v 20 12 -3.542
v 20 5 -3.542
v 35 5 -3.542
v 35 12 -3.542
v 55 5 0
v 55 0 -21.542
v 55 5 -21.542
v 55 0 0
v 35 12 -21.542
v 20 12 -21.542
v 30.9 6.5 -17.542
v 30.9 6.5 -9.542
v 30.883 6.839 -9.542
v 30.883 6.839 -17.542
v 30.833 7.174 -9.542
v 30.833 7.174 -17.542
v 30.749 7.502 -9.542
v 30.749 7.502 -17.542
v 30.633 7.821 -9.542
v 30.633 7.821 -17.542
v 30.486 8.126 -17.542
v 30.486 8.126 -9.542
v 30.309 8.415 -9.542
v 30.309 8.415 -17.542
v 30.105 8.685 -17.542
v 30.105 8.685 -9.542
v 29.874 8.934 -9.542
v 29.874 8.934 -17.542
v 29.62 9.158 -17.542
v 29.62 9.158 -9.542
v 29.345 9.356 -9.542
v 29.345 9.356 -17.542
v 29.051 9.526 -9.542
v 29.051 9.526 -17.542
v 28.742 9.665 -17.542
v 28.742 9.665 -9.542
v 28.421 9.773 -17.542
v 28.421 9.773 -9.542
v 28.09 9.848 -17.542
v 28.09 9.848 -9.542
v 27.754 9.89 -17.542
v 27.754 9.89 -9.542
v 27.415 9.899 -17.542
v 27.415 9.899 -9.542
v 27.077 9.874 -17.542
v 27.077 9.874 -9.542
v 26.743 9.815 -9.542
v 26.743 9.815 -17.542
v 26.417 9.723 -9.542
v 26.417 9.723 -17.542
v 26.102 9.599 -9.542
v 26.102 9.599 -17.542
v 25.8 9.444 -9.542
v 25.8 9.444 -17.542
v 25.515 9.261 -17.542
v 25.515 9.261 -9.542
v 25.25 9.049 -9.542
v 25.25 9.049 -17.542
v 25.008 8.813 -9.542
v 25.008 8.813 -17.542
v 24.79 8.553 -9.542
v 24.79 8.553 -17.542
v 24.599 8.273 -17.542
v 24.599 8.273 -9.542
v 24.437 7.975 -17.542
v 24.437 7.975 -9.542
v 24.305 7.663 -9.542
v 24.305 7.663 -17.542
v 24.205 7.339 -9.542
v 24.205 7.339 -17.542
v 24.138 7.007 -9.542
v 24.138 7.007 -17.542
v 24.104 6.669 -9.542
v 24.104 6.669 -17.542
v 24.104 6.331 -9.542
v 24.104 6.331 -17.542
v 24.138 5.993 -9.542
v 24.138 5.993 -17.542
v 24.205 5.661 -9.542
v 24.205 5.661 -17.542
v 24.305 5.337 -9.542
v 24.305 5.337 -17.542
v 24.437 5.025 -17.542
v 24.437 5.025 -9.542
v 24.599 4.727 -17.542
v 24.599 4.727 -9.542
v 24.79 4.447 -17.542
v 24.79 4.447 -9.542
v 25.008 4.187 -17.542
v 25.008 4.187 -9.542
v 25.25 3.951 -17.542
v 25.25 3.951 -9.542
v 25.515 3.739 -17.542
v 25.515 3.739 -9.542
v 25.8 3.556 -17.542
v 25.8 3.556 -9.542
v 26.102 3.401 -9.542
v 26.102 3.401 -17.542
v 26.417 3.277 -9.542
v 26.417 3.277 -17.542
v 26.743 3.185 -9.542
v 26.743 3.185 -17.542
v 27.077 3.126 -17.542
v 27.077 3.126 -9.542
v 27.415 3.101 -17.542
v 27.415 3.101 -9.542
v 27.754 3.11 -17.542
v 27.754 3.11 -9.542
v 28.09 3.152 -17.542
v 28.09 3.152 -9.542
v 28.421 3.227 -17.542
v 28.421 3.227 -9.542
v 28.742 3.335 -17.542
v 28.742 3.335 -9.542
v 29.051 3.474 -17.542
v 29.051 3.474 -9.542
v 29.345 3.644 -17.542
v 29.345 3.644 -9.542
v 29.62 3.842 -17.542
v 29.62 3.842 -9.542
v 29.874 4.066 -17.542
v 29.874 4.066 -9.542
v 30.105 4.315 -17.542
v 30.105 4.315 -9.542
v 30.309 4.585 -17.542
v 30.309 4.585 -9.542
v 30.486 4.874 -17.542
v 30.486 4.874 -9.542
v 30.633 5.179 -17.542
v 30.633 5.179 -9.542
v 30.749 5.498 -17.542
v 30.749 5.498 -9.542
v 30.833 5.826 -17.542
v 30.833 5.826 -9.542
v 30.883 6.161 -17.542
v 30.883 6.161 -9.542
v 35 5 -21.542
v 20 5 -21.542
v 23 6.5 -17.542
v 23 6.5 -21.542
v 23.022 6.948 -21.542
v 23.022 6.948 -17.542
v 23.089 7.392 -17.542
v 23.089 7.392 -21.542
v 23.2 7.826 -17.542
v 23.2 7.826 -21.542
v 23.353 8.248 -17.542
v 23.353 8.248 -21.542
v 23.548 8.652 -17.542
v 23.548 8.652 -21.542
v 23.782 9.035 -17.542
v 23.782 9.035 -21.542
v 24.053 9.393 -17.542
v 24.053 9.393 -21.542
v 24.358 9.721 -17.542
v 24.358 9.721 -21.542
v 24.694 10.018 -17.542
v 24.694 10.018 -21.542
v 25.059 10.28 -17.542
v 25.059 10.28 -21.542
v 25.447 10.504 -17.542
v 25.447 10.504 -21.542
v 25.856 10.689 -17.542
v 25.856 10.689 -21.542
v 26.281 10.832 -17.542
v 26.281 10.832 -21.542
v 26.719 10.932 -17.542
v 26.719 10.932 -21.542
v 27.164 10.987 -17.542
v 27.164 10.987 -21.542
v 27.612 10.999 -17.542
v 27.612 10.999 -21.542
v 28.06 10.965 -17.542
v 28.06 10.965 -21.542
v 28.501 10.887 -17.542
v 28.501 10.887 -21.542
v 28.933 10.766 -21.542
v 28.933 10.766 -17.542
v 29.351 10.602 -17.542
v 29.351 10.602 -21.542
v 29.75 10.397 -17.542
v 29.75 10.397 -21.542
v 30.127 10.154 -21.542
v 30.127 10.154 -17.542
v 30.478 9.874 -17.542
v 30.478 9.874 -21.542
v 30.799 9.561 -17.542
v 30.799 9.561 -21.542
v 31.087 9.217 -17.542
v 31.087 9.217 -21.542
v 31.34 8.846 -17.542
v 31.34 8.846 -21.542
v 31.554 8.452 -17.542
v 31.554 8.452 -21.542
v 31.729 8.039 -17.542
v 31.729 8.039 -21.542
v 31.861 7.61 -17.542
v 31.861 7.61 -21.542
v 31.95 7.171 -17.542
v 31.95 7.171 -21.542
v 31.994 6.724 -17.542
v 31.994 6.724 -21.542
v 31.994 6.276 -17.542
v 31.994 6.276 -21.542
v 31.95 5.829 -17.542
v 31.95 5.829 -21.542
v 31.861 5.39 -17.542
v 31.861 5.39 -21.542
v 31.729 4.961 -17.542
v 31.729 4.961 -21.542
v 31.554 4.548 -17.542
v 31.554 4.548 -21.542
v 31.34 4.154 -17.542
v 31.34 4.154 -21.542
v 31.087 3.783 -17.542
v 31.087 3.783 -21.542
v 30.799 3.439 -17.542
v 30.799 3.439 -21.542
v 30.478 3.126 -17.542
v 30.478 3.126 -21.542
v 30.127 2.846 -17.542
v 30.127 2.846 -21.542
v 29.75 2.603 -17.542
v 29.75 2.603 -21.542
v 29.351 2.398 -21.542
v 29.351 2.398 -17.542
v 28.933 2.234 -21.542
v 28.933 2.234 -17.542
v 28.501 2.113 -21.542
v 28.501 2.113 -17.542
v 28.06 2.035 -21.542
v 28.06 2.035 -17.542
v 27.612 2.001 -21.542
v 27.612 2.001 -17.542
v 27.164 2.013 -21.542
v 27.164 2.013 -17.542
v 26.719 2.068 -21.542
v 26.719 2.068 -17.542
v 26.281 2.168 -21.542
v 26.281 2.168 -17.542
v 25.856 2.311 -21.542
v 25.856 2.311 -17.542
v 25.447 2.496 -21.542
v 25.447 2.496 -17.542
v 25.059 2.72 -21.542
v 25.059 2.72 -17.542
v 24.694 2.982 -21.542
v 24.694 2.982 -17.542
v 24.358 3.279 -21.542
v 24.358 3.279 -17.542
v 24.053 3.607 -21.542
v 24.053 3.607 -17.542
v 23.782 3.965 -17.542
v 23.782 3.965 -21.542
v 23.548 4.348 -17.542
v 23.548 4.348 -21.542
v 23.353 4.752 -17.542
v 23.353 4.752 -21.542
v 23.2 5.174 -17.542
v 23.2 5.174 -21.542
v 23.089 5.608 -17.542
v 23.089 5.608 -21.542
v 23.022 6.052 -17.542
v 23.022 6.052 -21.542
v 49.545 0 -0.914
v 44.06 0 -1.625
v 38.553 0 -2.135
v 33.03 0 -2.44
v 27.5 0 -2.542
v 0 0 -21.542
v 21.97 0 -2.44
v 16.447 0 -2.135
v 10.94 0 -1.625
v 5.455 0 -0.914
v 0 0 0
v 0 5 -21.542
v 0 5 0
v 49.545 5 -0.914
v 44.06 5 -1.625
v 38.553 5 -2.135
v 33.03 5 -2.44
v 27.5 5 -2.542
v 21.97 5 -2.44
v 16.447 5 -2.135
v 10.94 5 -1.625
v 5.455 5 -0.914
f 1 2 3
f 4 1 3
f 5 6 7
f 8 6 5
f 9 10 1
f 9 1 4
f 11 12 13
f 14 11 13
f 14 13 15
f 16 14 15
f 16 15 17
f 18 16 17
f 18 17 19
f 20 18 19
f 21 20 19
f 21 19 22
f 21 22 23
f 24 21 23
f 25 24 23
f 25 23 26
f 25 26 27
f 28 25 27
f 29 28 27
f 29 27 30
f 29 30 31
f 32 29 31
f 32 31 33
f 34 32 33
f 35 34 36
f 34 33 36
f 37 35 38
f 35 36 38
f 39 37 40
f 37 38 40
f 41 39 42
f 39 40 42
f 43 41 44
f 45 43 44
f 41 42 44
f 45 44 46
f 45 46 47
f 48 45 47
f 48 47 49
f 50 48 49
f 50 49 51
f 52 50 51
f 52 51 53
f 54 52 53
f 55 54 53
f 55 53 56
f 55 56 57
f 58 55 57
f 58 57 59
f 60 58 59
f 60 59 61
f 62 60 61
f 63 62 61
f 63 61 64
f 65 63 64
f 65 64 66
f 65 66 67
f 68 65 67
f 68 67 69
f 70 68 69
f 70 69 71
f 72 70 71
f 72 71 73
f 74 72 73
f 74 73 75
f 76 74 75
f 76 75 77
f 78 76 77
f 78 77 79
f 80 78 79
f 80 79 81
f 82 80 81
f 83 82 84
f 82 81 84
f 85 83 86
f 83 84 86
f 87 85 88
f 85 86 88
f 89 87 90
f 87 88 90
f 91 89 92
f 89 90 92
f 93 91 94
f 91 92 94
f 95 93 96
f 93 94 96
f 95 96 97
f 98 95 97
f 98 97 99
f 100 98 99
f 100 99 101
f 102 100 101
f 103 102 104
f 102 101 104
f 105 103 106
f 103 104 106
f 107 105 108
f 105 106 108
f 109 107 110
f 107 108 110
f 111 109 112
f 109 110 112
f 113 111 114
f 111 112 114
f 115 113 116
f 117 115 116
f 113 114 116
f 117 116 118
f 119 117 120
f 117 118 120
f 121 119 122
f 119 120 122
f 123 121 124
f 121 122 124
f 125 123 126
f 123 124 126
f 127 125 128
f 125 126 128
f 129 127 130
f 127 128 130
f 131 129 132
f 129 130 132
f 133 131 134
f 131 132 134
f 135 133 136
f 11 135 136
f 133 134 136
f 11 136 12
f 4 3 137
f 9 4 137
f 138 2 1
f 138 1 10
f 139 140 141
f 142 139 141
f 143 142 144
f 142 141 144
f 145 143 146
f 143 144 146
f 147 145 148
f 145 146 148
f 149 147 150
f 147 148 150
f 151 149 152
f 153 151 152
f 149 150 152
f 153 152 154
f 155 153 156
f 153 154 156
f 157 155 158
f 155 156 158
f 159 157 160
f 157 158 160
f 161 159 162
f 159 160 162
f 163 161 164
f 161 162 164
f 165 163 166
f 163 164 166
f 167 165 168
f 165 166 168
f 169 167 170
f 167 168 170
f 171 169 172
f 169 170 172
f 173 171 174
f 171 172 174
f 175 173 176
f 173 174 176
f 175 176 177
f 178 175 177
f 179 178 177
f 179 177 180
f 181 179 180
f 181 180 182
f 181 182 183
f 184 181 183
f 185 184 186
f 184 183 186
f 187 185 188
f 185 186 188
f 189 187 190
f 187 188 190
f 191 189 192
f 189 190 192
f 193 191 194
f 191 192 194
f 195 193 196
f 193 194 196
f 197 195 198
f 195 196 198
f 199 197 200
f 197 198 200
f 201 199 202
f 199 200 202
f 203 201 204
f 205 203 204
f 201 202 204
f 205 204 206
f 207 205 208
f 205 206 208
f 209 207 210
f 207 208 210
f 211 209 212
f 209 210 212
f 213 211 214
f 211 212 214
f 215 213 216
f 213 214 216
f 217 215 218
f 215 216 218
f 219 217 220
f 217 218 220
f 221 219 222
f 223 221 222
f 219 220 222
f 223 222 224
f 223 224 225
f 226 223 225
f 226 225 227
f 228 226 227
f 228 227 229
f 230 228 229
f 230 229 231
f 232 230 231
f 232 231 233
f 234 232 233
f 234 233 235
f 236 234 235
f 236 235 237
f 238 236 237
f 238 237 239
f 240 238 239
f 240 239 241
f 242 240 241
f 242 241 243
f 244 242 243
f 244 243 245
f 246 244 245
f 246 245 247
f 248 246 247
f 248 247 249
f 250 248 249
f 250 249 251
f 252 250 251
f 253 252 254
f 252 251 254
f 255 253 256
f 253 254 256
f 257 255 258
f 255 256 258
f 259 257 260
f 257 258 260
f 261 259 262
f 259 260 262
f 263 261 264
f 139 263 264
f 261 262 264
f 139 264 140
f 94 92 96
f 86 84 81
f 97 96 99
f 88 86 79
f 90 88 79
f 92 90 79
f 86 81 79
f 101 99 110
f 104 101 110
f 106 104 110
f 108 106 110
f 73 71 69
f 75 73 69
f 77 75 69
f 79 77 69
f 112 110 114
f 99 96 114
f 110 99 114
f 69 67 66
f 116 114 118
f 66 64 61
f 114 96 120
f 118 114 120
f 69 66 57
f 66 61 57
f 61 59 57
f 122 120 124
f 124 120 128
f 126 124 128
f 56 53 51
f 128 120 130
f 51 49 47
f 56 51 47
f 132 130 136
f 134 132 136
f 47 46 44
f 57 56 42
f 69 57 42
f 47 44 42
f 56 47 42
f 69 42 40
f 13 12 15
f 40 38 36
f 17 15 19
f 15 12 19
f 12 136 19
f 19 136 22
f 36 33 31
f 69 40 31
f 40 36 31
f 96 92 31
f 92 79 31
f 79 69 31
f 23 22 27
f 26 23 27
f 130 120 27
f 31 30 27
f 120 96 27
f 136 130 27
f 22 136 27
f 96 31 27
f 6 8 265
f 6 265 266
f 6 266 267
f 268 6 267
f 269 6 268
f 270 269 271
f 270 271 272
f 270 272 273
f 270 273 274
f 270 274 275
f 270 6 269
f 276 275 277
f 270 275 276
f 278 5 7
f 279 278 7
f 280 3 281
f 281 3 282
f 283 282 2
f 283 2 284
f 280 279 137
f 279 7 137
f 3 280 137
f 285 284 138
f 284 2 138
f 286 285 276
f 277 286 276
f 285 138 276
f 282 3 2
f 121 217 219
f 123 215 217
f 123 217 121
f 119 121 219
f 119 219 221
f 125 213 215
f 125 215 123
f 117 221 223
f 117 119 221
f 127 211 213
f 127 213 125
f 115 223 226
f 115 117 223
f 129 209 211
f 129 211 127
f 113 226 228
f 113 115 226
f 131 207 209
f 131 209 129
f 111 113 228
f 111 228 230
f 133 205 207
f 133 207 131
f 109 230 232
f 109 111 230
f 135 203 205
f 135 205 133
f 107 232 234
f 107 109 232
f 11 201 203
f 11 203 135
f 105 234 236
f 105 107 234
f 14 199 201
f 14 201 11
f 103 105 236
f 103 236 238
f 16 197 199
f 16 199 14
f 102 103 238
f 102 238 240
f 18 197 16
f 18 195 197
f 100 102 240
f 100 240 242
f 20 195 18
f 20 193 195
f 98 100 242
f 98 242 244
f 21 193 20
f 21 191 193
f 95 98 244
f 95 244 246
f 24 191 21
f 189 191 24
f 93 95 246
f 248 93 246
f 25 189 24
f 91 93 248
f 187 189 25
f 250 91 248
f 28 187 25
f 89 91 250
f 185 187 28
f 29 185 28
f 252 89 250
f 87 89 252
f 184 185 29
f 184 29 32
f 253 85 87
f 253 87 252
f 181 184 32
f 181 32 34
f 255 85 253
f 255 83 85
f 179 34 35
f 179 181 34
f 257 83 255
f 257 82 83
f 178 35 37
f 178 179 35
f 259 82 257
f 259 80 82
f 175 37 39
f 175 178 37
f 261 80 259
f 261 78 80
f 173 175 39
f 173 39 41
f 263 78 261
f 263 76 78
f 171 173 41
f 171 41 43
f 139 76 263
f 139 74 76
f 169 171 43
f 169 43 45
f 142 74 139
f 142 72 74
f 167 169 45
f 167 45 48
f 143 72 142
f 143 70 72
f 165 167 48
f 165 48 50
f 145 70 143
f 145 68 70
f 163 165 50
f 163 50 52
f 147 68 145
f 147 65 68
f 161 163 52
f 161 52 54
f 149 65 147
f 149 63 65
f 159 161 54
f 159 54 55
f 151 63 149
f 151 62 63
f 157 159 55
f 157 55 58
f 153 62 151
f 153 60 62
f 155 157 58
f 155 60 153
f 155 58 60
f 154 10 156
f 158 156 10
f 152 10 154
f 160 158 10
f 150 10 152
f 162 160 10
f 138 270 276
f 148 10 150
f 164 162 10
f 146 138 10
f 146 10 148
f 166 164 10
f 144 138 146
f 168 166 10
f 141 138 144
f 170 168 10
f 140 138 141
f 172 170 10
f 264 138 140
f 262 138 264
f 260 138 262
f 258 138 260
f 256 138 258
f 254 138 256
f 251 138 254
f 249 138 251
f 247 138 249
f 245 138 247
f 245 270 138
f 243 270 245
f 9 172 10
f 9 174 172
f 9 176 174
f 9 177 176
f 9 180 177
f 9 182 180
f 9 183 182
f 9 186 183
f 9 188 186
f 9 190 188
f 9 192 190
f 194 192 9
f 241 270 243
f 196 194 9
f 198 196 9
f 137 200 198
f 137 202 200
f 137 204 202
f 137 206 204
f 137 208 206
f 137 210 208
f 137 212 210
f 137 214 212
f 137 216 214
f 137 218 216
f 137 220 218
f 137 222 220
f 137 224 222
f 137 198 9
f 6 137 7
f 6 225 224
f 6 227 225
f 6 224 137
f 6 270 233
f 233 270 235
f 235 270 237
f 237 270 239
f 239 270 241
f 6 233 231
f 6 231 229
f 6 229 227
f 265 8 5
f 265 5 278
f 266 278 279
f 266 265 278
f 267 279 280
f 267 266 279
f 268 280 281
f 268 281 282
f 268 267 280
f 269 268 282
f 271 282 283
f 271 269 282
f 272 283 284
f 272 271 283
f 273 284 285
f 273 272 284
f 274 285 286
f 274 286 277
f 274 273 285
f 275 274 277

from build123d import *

# Parameters (mm, degrees)
BOSS_EXTRUDE1_DEPTH              = 5
SKETCH2_W                        = 15
SKETCH2_H                        = 18
BOSS_EXTRUDE2_DEPTH              = 7
SKETCH3_R                        = 4.5
CUT_EXTRUDE2_DEPTH               = 4
TAP_DRILL_FOR_M8X1_25_TAP1_D     = 6.8
TAP_DRILL_FOR_M8X1_25_TAP1_DEPTH = 8


with BuildPart() as part:
    # Sketch1 → Boss-Extrude1 (new body)
    with BuildSketch(Plane(origin=(0, 0, 0), x_dir=(1, 0, 0), z_dir=(0, 1, 0))):
        with BuildLine():
            Line((0, 0), (0, 21.542378969))
            Line((0, 21.542378969), (55, 21.542378969))
            Line((55, 21.542378969), (55, 0))
            ThreePointArc((55, 0), (27.5, 2.542378969), (0, 0))
        make_face()
    extrude(amount=BOSS_EXTRUDE1_DEPTH)

    # Sketch2 → Boss-Extrude2 (add)
    with BuildSketch(Plane(origin=(0, 5, 0), x_dir=(1, 0, 0), z_dir=(0, 1, 0))):
        with Locations((27.5, 12.542378969)):
            Rectangle(SKETCH2_W, SKETCH2_H)
    extrude(amount=BOSS_EXTRUDE2_DEPTH)

    # Sketch3 → Cut-Extrude2 (cut)
    with BuildSketch(Plane(origin=(0, 0, -21.542378969), x_dir=(-1, 0, 0), z_dir=(0, 0, -1))):
        with Locations((-27.5, 6.5)):
            Circle(SKETCH3_R)
    extrude(amount=-CUT_EXTRUDE2_DEPTH, mode=Mode.SUBTRACT)

    # Tap Drill for M8x1.25 Tap1
    with Locations(Plane(origin=(0, 0, -17.542378969), x_dir=(-1, 0, 0), z_dir=(0, 0, -1))):
        with Locations((-27.5, 6.5)):
            Hole(TAP_DRILL_FOR_M8X1_25_TAP1_D / 2, depth=TAP_DRILL_FOR_M8X1_25_TAP1_DEPTH)


solid = part.part
